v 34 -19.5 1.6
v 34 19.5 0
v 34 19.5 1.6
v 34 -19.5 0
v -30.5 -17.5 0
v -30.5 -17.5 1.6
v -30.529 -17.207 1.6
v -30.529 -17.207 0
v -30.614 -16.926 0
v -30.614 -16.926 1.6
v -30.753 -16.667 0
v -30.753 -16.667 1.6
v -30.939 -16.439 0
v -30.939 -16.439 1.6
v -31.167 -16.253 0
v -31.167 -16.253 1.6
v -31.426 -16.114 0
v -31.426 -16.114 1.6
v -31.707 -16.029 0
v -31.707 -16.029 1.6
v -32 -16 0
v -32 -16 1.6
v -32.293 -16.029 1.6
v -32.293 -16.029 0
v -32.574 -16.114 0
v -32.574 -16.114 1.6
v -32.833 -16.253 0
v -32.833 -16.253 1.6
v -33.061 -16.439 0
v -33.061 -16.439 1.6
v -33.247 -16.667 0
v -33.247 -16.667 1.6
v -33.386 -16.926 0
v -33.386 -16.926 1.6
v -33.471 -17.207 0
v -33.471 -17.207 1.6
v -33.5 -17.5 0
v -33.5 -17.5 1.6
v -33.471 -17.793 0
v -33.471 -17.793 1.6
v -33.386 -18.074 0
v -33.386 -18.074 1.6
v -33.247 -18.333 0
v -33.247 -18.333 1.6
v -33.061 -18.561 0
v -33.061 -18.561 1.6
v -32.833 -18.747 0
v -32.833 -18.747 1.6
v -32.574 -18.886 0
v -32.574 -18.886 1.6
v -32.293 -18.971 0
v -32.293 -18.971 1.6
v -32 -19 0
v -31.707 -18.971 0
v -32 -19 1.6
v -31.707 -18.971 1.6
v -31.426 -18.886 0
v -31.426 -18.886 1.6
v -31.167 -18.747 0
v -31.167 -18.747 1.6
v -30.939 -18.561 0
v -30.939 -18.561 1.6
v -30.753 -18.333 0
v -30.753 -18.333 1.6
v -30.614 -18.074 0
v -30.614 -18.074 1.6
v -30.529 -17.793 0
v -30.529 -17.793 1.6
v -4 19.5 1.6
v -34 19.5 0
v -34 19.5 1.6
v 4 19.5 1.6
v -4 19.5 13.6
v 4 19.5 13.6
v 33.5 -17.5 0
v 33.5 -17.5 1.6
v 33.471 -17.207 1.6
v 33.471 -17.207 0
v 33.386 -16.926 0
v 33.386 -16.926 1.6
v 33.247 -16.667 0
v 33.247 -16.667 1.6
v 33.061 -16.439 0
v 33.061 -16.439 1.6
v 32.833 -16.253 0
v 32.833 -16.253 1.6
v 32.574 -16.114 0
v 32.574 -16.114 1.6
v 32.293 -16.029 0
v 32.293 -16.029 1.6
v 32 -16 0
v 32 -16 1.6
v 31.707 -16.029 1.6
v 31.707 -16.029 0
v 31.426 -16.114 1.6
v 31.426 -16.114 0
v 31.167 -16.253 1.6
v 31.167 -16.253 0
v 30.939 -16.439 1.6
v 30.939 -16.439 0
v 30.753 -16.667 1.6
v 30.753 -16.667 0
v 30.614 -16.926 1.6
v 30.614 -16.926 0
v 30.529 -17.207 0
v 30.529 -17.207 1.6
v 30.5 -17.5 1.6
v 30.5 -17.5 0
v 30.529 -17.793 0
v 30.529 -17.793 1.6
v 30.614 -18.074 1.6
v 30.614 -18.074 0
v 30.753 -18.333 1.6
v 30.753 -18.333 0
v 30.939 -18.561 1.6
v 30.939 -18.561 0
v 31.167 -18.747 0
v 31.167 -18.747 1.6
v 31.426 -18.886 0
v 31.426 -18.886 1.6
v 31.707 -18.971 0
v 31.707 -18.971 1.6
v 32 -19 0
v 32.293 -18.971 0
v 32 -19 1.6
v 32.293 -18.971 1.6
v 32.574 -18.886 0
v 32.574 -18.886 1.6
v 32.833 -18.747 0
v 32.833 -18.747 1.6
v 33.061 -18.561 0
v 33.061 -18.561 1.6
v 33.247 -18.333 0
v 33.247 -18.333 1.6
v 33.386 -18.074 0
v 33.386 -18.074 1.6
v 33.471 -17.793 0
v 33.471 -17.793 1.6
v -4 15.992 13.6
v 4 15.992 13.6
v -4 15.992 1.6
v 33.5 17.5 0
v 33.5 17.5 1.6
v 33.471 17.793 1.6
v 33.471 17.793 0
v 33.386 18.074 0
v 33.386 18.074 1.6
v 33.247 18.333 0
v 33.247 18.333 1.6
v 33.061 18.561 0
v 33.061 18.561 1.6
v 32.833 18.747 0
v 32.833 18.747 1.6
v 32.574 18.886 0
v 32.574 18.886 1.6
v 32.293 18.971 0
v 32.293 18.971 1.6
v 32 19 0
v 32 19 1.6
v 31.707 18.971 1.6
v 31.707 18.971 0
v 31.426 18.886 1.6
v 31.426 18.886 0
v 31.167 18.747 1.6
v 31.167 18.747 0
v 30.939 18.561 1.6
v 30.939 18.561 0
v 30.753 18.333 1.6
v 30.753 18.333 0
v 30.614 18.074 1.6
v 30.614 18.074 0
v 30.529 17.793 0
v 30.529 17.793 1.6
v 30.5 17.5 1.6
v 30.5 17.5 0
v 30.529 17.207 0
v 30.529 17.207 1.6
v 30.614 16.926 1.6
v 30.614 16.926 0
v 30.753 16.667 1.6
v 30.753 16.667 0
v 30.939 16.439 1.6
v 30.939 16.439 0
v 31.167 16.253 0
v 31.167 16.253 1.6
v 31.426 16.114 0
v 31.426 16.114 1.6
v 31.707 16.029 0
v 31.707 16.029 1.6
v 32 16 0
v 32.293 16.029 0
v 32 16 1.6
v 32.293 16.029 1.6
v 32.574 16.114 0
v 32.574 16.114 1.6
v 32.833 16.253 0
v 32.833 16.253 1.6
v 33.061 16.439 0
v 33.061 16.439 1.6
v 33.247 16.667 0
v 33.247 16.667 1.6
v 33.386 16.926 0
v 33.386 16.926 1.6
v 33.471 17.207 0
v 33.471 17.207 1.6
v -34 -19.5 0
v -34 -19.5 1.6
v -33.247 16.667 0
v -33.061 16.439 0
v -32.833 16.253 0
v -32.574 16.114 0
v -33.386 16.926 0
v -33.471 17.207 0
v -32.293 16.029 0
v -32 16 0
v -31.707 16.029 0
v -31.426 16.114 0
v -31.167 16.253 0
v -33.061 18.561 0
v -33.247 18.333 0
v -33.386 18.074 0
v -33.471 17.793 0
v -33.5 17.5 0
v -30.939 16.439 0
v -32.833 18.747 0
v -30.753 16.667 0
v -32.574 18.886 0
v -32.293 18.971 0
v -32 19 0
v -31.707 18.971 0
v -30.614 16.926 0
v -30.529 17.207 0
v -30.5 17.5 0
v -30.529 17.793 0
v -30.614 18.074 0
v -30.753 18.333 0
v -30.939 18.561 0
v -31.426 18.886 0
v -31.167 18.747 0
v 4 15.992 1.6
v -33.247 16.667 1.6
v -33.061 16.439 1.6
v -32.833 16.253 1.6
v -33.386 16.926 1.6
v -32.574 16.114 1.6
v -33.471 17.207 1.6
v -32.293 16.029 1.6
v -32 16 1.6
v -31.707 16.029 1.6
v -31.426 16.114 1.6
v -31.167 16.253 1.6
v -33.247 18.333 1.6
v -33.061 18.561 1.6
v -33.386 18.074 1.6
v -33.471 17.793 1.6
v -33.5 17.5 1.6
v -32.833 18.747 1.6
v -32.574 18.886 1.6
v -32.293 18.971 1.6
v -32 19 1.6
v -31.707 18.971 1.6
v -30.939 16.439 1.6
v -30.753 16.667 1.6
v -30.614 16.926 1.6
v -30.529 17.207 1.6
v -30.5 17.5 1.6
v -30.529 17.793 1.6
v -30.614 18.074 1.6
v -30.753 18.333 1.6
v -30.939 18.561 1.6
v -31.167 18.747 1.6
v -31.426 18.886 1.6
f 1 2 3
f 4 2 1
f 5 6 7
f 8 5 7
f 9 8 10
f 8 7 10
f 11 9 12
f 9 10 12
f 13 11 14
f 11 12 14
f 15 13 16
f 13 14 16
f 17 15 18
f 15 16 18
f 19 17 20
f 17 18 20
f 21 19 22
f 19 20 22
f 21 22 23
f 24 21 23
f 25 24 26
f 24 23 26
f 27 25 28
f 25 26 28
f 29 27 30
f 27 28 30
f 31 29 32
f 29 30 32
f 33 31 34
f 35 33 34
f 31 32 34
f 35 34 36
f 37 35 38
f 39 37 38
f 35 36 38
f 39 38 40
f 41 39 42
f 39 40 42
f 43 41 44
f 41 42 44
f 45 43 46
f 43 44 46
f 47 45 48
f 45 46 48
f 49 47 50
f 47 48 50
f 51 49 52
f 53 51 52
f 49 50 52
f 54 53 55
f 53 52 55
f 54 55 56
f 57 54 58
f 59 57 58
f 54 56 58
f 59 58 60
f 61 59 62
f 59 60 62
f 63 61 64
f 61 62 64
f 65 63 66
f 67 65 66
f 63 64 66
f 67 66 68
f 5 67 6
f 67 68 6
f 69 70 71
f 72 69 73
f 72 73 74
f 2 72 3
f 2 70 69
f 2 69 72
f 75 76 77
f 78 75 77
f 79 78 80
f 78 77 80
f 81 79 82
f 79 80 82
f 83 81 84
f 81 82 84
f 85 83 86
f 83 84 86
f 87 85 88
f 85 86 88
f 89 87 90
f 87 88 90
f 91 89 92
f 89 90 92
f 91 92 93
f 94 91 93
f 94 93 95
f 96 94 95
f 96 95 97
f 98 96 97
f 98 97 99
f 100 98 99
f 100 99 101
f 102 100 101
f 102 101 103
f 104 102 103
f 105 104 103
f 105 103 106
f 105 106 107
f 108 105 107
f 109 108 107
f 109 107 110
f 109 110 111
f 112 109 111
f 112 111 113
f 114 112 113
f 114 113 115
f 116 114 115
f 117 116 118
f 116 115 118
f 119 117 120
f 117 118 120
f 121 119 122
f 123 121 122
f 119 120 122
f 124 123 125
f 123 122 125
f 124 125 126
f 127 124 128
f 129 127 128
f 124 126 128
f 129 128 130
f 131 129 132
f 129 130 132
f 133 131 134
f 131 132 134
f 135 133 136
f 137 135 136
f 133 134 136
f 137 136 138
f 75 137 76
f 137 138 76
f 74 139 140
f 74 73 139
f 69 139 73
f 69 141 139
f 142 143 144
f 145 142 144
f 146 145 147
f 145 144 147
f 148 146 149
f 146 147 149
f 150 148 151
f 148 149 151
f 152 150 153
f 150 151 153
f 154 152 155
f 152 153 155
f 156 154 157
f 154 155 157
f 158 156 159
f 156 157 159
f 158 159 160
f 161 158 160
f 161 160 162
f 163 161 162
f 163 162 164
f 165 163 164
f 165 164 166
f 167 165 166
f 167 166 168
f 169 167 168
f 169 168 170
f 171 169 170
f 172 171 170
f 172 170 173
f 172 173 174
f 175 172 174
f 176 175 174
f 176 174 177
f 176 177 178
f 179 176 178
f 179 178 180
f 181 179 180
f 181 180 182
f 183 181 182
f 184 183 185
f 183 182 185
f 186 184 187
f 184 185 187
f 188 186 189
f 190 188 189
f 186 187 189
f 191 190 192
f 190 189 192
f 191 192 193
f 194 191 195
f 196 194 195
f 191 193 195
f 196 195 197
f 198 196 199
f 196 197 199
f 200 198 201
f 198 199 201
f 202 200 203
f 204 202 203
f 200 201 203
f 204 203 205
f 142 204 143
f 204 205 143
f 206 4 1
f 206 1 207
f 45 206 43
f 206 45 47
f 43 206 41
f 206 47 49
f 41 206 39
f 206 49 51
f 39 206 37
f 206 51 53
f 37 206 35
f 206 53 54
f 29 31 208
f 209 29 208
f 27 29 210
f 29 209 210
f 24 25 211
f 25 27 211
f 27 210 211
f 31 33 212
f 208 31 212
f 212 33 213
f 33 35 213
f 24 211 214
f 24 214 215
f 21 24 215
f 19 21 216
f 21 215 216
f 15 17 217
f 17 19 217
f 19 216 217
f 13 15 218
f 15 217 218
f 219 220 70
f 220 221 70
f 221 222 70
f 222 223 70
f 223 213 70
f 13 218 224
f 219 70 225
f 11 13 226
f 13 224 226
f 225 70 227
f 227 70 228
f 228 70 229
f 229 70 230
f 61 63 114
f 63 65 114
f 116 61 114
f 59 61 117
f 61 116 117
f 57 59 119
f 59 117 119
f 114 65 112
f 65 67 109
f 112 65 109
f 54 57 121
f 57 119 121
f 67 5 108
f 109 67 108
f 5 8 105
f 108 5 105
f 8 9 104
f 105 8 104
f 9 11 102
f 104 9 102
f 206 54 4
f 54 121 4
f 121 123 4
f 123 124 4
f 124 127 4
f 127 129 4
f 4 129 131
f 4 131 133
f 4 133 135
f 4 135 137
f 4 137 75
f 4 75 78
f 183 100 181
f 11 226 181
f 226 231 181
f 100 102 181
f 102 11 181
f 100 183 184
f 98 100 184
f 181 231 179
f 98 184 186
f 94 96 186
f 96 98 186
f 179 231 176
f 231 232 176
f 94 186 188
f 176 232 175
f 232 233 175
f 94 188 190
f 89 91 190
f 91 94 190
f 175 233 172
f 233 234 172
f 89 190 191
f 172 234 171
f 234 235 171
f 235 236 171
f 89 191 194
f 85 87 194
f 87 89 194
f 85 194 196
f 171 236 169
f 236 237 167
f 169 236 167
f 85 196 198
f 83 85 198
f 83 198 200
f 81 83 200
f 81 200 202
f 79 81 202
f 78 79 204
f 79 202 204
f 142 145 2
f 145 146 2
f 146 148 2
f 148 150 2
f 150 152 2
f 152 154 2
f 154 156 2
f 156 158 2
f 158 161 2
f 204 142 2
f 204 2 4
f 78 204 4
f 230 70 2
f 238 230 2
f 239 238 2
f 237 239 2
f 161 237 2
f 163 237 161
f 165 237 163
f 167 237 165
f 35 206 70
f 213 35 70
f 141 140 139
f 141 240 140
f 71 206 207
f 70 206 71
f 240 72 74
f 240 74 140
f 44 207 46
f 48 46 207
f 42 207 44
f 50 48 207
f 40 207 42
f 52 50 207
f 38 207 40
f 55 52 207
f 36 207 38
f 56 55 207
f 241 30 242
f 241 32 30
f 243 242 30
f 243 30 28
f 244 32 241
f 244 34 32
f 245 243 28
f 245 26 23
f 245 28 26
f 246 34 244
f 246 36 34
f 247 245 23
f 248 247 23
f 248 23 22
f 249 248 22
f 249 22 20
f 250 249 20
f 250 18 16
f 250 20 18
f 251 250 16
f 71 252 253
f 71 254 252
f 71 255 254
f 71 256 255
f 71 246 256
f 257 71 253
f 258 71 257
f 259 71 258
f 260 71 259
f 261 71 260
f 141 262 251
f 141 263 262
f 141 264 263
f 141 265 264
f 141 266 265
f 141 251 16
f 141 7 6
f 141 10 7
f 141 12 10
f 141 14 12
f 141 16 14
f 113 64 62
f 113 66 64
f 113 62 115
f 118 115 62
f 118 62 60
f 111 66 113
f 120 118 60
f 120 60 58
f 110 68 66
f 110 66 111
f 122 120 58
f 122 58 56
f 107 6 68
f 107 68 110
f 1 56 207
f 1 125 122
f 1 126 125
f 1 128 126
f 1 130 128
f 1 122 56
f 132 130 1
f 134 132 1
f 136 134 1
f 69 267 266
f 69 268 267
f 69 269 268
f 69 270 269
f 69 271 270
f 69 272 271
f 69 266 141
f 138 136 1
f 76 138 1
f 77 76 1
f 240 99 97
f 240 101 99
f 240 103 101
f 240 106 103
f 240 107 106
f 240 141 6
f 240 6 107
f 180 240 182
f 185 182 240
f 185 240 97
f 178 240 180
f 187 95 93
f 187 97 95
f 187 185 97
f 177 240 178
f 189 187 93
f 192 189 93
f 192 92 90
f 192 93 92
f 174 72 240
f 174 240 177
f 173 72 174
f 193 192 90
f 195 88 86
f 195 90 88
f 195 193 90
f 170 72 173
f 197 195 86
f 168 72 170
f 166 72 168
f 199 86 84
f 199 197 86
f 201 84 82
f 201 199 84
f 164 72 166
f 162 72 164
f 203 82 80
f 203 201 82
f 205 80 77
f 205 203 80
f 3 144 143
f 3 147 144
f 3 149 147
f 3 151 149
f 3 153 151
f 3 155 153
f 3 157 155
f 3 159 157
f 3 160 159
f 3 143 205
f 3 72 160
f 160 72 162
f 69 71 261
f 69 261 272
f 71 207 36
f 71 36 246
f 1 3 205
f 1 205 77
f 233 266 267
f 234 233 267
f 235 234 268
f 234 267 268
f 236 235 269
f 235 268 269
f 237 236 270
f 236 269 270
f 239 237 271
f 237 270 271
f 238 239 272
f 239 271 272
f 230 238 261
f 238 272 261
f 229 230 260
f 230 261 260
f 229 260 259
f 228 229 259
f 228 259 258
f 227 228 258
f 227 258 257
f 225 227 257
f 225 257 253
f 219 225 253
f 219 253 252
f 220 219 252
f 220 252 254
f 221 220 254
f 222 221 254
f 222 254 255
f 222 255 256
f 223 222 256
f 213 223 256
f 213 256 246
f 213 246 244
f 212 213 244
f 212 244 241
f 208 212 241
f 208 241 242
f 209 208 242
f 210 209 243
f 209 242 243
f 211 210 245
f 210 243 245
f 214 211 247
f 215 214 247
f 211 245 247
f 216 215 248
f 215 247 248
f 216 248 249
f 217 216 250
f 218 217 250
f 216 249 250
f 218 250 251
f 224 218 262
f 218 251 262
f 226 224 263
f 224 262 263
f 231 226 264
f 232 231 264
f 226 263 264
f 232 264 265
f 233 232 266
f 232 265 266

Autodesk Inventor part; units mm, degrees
ref_plane "YZ Plane" through (0, 0, 0) normal (1, 0, 0) x (0, 1, 0)
ref_plane "XZ Plane" through (0, 0, 0) normal (0, 1, 0) x (-1, 0, 0)
ref_plane "XY Plane" through (0, 0, 0) normal (0, 0, 1) x (1, 0, 0)
sketch "스케치1" plane through (0, 0, 0) normal (0, 0, 1) x (1, 0, 0)
  line L0 (-34, 19.5) -> (34, 19.5)
  line L1 (34, 19.5) -> (34, -19.5)
  line L2 (34, -19.5) -> (-34, -19.5)
  line L3 (-34, -19.5) -> (-34, 19.5)
  line L4 (-34, 19.5) -> (34, -19.5) construction
  line L5 (34, 19.5) -> (-34, -19.5) construction
  point P0 (0, 0)
  dimension "d0" = 68
  dimension "d1" = 39
extrude "돌출1" add sketch "스케치1" along normal blind 1.6
sketch "스케치3" plane through (0, 0, 1.6) normal (0, 0, 1) x (1, 0, 0)
  circle A0 centre (32, 17.5) radius 2
  circle A1 centre (-32, 17.5) radius 2
  circle A2 centre (-32, -17.5) radius 2
  circle A3 centre (32, -17.5) radius 2
  line L0 (34, 19.5) -> (-34, 19.5) projected
  line L1 (34, -19.5) -> (34, 19.5) projected
  line L2 (-34, -19.5) -> (34, -19.5) projected
  line L3 (-34, 19.5) -> (-34, -19.5) projected
  circle A4 centre (-32, 17.5) radius 1.5
  circle A5 centre (32, 17.5) radius 1.5
  circle A6 centre (32, -17.5) radius 1.5
  circle A7 centre (-32, -17.5) radius 1.5
  point P0 (0, 0)
  dimension "d4" = 4
  dimension "d5" = 4
  dimension "d6" = 4
  dimension "d7" = 4
  dimension "d8" = 3
  dimension "d9" = 3
  dimension "d10" = 3
  dimension "d11" = 3
extrude "돌출2" cut sketch "스케치3" against normal up to surface (1.6 mm away) contours A4 | A5 | A6 | A7
sketch "스케치4" plane through (0, 0, 1.6) normal (0, 0, 1) x (1, 0, 0)
  line L0 (4, 15.9921) -> (-4, 15.9921)
  line L1 (-4, 15.9921) -> (-4, 19.5)
  line L2 (-4, 19.5) -> (4, 19.5)
  line L3 (4, 19.5) -> (4, 15.9921)
  line L4 (4, 15.9921) -> (-4, 19.5) construction
  line L5 (-4, 15.9921) -> (4, 19.5) construction
  line L6 (34, 19.5) -> (-34, 19.5) projected
  line L7 (0, -27.3) -> (0, 27.3) projected
  point P0 (0, 0)
  point P1 (0, 17.746)
  point P2 (0, 19.5)
  point P3 (-4, 17.746)
  dimension "d14" = 8
extrude "돌출3" add sketch "스케치4" along normal blind 12
properties part number "컨버터"
